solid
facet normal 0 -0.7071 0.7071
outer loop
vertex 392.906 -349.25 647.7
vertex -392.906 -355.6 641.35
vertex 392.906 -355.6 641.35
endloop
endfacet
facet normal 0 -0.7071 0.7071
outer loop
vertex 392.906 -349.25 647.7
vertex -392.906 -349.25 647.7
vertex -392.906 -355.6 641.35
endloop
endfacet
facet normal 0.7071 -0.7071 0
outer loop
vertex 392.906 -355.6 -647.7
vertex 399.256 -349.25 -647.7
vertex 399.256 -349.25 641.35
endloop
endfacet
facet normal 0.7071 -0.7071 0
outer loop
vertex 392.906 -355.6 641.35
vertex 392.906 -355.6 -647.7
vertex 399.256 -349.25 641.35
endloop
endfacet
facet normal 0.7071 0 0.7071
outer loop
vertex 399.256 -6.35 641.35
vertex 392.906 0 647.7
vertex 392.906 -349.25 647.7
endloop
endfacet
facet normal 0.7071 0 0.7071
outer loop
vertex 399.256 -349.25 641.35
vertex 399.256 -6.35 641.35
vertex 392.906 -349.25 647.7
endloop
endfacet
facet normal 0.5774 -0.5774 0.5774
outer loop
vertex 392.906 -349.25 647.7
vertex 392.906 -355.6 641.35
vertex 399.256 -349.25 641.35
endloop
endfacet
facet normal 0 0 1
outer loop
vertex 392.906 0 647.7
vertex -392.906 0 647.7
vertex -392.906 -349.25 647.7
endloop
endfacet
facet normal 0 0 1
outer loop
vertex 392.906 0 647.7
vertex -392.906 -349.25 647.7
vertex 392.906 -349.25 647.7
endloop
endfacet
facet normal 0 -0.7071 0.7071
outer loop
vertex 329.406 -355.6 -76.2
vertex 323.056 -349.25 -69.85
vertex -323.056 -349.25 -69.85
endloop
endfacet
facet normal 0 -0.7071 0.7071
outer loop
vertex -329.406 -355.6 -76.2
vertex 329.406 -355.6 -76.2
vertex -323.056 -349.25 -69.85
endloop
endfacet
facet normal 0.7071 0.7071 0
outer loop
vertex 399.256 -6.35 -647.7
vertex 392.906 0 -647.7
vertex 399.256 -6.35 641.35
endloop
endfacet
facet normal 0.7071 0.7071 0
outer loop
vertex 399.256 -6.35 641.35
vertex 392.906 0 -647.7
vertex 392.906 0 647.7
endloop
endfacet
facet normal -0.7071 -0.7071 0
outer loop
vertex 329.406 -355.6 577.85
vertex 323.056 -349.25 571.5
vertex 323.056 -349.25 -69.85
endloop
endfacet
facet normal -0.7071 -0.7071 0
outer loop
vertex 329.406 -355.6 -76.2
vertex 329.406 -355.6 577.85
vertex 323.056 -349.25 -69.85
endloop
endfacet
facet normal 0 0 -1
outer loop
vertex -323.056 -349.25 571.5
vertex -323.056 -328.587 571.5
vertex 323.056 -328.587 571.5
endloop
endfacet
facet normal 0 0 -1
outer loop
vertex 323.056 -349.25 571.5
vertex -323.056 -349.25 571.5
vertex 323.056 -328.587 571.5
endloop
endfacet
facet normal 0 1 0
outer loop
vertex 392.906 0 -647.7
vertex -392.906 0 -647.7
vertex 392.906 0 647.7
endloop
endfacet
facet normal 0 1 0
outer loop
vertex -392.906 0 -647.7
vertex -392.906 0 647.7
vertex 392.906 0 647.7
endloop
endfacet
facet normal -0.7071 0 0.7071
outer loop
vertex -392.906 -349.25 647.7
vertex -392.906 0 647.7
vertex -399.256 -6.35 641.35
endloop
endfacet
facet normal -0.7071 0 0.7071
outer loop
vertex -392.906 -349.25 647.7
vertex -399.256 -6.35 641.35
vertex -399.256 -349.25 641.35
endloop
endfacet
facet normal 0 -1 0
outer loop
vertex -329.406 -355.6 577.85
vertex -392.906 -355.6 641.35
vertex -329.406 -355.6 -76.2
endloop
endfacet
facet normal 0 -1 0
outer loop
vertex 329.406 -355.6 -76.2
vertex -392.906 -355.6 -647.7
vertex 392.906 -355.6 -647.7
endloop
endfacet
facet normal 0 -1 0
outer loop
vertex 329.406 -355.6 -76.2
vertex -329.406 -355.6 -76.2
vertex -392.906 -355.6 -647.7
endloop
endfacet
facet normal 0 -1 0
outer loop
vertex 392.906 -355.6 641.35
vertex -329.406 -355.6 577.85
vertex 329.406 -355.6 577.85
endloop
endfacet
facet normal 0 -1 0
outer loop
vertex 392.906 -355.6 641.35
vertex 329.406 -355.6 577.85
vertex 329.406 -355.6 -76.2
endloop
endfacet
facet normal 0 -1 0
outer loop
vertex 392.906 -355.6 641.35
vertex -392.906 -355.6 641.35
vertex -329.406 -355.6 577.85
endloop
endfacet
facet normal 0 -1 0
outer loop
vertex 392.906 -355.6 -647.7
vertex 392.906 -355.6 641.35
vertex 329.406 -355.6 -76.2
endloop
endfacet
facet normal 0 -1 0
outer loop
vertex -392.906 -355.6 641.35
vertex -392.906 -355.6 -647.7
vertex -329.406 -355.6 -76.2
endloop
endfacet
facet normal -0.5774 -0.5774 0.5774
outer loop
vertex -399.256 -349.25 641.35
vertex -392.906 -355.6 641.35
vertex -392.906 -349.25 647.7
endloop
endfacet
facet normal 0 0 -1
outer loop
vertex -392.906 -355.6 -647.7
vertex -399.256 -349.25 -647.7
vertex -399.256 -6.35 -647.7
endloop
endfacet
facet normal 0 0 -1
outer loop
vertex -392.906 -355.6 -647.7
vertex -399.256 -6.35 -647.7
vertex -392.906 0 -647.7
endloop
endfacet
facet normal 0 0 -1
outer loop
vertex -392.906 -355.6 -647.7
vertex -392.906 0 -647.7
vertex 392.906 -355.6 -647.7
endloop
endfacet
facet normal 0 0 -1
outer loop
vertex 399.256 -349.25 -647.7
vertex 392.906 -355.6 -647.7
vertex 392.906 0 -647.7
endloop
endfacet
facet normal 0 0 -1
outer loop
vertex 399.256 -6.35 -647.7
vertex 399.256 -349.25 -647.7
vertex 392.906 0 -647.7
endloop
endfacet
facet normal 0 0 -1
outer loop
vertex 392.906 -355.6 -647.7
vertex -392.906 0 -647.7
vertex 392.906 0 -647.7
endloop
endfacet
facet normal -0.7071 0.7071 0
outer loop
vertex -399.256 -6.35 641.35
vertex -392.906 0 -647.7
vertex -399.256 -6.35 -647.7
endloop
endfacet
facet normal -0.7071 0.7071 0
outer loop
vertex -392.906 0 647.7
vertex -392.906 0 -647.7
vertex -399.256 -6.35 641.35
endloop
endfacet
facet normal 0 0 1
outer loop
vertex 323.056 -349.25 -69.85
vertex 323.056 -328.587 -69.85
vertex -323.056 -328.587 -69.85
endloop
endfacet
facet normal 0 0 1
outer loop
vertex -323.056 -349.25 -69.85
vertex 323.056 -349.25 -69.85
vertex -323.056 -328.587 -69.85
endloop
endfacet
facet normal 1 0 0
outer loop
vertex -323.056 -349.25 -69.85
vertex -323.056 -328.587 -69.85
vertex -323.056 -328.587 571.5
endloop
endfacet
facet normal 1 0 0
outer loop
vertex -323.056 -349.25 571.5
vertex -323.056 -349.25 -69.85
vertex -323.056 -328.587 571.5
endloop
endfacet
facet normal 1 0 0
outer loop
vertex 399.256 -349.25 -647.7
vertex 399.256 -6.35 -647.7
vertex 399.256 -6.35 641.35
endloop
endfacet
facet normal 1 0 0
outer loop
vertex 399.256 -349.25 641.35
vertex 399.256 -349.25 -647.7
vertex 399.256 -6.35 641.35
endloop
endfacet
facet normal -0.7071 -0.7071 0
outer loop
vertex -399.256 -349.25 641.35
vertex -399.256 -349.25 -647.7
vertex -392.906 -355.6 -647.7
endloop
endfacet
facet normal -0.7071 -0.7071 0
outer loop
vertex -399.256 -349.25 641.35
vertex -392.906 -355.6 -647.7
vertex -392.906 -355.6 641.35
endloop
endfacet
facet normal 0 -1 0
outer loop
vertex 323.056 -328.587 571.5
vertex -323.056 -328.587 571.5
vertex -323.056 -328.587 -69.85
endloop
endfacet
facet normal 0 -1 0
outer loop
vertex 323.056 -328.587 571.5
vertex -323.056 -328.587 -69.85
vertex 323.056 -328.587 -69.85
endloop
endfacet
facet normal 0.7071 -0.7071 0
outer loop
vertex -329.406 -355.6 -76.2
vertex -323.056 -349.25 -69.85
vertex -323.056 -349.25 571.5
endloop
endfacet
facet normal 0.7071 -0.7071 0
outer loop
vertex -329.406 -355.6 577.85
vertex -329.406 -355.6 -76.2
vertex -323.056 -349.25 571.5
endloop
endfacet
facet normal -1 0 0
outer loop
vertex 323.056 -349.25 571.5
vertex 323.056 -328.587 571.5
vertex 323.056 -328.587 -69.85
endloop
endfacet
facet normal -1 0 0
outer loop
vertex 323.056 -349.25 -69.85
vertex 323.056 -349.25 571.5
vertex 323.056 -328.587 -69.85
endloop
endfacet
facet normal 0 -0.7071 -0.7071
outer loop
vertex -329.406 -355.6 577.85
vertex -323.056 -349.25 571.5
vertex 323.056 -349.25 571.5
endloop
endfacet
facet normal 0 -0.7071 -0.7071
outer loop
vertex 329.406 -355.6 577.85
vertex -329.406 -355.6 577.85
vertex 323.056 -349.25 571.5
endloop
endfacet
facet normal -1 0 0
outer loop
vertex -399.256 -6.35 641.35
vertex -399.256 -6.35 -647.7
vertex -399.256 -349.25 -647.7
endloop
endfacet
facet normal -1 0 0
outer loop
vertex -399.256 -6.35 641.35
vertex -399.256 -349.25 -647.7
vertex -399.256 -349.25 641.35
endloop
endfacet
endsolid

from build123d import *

# Parameters (mm, degrees)
F0_W     = 798.5125
F0_H     = 1295.4
F1_DEPTH = 355.6
F2_DEPTH = 328.5871
F3_SIZE  = 6.35
F4_SIZE  = 6.35


with BuildPart() as f1:
    # F0 (on Front) → F1 (new body)
    with BuildSketch(Plane.XZ):
        Rectangle(F0_W, F0_H)
        Polygon((323.05625, 571.5), (323.05625, 323.85), (323.05625, -69.85), (-323.05625, -69.85), (-323.05625, 571.5), align=None, mode=Mode.SUBTRACT)
    extrude(amount=F1_DEPTH)

    # F0 (on Front) → F2 (join)
    with BuildSketch(Plane.XZ):
        Polygon((323.05625, -69.85), (323.05625, 323.85), (323.05625, 571.5), (-323.05625, 571.5), (-323.05625, -69.85), align=None)
    extrude(amount=F2_DEPTH)

    # F3
    f3_edges = [f1.edges().sort_by_distance(p)[0] for p in [
        (0, -355.6, -69.85),
        (-323.05625, -355.6, 250.825),
        (0, -355.6, 571.5),
        (323.05625, -355.6, 250.825),
    ]]
    chamfer(f3_edges, length=F3_SIZE)

    # F4
    f4_edges = [f1.edges().sort_by_distance(p)[0] for p in [
        (399.25625, -355.6, 0),
        (0, -355.6, 647.7),
        (-399.25625, -355.6, 0),
        (-399.25625, -177.8, 647.7),
        (399.25625, -177.8, 647.7),
        (-399.25625, 0, 0),
        (399.25625, 0, 0),
    ]]
    chamfer(f4_edges, length=F4_SIZE)


solid = f1.part
